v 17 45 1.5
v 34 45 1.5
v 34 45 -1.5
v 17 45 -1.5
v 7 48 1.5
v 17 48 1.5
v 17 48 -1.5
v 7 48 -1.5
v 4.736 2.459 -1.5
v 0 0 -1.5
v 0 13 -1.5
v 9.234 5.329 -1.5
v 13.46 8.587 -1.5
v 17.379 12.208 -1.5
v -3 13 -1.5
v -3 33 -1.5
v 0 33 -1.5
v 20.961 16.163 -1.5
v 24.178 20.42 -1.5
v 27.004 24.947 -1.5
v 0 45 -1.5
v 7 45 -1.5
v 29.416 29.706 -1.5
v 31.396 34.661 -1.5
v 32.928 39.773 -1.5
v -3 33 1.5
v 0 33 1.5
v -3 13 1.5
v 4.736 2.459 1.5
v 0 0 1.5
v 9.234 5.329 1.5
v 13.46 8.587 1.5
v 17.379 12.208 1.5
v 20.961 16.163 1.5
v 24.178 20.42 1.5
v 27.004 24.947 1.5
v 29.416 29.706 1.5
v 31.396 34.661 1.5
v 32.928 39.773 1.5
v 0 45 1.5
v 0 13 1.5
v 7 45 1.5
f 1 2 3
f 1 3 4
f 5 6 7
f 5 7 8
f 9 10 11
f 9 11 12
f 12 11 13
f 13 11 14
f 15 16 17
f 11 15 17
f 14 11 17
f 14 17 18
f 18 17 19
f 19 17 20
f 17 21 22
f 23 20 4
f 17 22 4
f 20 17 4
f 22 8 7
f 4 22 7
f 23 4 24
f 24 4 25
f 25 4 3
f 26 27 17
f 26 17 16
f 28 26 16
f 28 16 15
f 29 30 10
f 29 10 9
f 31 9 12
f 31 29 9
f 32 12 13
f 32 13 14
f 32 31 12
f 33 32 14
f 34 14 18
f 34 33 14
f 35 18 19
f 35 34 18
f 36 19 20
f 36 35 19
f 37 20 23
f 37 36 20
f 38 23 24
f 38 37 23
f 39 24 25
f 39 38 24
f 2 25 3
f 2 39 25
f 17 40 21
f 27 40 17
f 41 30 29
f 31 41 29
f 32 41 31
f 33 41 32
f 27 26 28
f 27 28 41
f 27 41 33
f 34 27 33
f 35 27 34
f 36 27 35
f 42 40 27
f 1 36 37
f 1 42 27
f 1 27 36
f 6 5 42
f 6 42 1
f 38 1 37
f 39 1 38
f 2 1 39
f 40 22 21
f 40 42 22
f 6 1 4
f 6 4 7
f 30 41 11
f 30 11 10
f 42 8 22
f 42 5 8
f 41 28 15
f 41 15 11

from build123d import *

# Parameters (mm, degrees)
EXTRUDE_1_DEPTH = 1.5


with BuildPart() as part:
    # 草图2 → 凸台-拉伸1 (new body, symmetric)
    with BuildSketch(Plane.XY):
        with BuildLine():
            Line((0, 45), (0, 33))
            Line((0, 33), (-3, 33))
            Line((-3, 33), (-3, 13))
            Line((-3, 13), (0, 13))
            Line((0, 13), (0, 0))
            ThreePointArc((0, 0), (22.61707334, 18.255989032), (34, 45))
            Line((34, 45), (17, 45))
            Line((17, 45), (17, 48))
            Line((17, 48), (7, 48))
            Line((7, 48), (7, 45))
            Line((7, 45), (0, 45))
        make_face()
    extrude(amount=EXTRUDE_1_DEPTH, both=True)


solid = part.part
